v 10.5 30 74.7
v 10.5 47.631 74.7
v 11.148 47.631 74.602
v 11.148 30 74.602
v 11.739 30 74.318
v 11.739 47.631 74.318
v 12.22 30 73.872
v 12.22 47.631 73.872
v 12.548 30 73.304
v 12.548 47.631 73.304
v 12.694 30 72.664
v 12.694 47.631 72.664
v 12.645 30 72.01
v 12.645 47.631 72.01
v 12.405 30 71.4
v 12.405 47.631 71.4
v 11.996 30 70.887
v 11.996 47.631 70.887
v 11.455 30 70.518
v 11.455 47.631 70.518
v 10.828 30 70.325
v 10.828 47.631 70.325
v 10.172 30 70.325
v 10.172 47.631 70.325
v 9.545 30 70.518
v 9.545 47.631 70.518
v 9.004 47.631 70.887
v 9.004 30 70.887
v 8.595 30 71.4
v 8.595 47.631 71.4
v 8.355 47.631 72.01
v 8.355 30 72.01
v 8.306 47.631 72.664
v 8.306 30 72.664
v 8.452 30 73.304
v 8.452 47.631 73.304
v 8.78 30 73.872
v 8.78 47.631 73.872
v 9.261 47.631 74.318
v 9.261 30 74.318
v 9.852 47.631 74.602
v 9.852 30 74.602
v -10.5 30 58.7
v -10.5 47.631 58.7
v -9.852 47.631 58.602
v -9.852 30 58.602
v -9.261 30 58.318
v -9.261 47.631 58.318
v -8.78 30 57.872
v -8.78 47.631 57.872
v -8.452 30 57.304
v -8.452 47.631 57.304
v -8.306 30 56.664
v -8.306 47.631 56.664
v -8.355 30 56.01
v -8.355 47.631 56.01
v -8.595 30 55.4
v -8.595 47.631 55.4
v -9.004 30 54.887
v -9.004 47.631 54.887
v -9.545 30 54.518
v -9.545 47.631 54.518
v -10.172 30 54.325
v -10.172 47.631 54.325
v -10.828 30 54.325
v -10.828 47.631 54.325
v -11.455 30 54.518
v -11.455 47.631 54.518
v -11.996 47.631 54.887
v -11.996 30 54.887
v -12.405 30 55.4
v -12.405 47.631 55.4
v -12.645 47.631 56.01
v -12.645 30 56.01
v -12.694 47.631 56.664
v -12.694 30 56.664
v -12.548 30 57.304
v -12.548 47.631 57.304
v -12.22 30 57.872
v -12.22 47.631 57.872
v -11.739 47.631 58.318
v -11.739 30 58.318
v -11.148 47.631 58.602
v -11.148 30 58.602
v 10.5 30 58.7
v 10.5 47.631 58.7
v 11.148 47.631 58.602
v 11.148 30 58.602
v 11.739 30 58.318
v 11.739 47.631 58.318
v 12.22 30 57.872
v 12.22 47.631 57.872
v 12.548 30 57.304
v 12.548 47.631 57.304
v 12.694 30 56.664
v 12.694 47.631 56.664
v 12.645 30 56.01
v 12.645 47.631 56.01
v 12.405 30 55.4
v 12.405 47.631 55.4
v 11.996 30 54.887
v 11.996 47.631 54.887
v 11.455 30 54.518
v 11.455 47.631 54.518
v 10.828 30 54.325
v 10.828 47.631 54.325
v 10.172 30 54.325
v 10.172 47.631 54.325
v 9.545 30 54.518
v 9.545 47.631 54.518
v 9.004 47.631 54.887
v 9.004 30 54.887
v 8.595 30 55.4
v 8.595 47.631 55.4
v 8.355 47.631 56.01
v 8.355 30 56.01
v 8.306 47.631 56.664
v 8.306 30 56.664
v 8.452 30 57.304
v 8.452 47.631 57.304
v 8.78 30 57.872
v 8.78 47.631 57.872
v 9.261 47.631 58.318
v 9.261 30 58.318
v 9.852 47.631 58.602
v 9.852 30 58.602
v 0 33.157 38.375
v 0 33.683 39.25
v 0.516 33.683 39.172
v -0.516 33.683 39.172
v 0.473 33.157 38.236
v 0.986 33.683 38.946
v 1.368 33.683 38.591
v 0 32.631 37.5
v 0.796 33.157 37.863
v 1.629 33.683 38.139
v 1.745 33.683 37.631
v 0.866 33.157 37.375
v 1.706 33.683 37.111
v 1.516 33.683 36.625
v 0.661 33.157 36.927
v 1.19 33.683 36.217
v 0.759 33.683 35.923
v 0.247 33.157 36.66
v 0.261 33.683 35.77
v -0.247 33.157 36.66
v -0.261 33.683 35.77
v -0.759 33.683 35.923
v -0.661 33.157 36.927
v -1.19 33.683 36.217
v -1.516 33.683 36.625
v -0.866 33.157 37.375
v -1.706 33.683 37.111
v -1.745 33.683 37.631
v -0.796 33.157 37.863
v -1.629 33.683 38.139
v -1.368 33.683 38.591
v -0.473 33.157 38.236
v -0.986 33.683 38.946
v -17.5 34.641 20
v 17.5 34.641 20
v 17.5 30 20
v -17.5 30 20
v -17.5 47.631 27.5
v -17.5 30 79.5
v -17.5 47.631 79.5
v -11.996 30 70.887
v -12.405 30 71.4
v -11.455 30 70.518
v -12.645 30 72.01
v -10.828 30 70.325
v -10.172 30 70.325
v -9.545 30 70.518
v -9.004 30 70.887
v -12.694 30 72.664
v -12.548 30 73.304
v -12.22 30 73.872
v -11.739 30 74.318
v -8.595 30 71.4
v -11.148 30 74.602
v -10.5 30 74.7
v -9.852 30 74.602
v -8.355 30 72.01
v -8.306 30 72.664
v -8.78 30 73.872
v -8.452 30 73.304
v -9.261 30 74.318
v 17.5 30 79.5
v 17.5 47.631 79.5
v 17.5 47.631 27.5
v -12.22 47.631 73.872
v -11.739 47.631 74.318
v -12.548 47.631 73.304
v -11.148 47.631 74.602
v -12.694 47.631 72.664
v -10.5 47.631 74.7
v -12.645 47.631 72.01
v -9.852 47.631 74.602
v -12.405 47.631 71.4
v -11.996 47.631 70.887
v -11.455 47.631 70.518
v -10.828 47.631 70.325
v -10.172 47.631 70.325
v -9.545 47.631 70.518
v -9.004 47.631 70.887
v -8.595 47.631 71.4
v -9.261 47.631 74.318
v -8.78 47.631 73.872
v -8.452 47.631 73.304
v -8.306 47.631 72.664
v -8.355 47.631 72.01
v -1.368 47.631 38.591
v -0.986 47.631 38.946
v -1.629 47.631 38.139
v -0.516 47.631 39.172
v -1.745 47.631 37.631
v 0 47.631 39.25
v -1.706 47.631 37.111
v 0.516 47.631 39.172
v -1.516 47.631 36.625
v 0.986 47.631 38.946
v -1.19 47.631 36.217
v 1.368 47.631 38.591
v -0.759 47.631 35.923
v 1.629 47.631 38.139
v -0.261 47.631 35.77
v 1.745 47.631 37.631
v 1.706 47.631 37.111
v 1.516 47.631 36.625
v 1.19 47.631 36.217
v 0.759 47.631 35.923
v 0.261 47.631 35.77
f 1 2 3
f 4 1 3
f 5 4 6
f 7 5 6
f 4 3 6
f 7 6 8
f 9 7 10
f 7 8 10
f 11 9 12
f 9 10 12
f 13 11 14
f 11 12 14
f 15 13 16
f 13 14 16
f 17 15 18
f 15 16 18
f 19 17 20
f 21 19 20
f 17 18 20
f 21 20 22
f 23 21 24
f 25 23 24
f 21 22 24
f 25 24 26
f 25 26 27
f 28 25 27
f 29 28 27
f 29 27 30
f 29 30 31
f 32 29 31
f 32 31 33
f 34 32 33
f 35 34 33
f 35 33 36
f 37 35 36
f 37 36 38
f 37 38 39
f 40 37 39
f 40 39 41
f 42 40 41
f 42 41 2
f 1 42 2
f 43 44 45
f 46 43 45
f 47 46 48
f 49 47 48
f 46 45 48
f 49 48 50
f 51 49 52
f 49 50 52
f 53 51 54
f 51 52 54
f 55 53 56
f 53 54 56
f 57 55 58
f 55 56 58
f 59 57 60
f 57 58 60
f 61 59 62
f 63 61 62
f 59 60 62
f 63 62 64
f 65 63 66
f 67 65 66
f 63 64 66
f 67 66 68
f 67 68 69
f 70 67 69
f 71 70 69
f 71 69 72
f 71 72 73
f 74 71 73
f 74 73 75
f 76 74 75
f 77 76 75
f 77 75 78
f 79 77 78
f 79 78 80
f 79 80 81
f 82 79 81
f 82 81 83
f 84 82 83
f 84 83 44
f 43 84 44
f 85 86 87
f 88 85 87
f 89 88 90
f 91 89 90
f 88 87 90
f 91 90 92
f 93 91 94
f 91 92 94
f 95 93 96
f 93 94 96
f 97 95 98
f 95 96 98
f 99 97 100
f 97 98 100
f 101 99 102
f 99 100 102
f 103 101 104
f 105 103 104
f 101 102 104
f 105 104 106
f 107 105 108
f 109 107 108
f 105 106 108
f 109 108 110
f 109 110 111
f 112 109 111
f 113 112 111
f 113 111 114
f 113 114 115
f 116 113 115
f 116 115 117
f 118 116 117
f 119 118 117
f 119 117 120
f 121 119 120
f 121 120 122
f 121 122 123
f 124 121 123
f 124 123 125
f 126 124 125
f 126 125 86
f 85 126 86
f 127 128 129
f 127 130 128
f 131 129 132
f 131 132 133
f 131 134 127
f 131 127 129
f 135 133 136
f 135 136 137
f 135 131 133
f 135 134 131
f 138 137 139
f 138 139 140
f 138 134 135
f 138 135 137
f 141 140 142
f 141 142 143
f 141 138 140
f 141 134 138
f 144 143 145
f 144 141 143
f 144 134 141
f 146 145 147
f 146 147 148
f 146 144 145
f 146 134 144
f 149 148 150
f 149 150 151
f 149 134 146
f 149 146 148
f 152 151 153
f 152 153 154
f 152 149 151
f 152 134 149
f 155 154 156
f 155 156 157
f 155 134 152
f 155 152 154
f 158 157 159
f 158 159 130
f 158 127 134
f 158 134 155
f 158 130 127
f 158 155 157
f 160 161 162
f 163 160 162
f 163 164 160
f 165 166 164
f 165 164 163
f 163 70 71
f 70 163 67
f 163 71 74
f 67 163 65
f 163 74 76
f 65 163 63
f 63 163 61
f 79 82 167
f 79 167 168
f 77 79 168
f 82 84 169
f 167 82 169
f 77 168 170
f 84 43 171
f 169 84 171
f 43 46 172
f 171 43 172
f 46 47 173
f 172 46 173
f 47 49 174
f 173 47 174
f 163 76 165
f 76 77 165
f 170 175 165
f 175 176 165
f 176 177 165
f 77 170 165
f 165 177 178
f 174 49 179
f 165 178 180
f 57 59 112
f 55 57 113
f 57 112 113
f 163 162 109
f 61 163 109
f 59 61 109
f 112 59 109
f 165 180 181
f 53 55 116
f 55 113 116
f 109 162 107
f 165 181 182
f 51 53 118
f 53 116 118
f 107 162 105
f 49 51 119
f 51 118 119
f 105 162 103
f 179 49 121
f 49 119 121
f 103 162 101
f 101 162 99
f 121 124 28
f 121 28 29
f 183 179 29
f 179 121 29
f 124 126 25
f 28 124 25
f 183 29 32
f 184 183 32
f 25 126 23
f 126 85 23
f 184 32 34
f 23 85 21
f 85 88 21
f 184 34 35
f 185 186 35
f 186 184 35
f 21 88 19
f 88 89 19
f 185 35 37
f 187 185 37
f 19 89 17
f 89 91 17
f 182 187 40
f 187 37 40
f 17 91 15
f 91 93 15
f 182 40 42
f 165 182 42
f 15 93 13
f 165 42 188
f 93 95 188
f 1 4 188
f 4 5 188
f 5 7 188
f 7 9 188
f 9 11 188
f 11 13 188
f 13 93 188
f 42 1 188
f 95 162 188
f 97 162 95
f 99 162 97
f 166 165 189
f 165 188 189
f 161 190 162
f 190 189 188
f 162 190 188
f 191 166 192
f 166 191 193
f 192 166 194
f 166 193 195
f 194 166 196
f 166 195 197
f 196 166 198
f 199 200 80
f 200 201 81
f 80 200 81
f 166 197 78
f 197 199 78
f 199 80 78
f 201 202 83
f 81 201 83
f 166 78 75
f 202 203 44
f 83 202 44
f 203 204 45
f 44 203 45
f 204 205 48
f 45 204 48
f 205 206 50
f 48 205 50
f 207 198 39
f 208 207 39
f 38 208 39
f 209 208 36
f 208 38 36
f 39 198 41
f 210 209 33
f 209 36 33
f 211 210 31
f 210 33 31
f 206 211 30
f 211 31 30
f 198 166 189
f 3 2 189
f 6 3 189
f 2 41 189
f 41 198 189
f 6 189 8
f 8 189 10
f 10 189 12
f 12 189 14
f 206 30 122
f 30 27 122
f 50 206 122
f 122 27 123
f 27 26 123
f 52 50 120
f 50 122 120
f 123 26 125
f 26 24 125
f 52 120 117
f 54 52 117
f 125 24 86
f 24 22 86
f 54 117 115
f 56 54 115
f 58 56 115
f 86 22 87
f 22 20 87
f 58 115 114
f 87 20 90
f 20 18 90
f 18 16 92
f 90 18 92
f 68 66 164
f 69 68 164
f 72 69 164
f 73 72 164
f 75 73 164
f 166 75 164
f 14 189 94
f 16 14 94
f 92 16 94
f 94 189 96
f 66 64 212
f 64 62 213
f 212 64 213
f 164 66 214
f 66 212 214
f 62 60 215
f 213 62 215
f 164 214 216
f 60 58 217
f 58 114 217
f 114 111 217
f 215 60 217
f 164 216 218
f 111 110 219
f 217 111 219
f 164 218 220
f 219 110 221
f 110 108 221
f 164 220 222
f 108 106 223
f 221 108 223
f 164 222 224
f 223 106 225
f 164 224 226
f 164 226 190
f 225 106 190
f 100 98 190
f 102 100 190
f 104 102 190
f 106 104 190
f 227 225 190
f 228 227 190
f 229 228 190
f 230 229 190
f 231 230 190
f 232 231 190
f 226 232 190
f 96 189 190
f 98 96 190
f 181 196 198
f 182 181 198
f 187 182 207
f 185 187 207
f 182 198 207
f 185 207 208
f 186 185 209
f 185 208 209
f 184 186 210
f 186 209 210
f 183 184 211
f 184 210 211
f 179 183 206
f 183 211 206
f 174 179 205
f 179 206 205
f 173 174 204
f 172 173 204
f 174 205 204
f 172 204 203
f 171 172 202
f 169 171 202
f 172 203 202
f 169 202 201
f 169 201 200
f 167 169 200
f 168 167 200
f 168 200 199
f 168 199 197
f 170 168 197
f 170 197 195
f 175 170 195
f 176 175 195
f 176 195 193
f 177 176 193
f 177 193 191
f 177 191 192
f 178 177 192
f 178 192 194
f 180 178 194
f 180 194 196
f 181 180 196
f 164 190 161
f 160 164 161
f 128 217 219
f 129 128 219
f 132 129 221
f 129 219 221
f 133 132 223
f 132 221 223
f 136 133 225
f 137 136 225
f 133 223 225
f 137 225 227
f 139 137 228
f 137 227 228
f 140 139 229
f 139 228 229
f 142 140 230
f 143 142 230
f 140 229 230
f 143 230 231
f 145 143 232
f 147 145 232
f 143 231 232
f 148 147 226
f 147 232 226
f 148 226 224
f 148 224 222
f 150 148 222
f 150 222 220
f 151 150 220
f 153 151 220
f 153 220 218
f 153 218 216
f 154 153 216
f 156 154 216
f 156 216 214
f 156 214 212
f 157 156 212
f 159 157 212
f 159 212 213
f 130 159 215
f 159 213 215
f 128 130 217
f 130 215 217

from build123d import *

# Parameters (mm, degrees)
PAD_DEPTH      = 17.5
SKETCH001_R    = 2.2
HOLE_DEPTH     = 17.632397
SKETCH002_R    = 1.75
HOLE001_DEPTH  = 13.948494
HOLE001_TIPS_R = 1.75


with BuildPart() as part:
    # Sketch → Pad (new body, symmetric)
    with BuildSketch(Plane.YZ):
        Polygon((30, 20), (30, 79.5), (47.631397, 79.5), (47.631397, 27.5), (34.641016, 20), align=None)
    extrude(amount=PAD_DEPTH, both=True)

    # Sketch001 (on Face3 of Pad) → Hole (cut, through all)
    with BuildSketch(Plane.ZX.offset(47.631397)):
        with Locations((72.5, 10.5)):
            Circle(SKETCH001_R)
        with Locations((56.5, 10.5)):
            Circle(SKETCH001_R)
        with Locations((56.5, -10.5)):
            Circle(SKETCH001_R)
        with Locations((72.5, -10.5)):
            Circle(SKETCH001_R)
    extrude(amount=-HOLE_DEPTH, mode=Mode.SUBTRACT)

    # Sketch002 (on Face11 of Hole) → Hole001 (cut)
    with BuildSketch(Plane.ZX.offset(47.631397)):
        with Locations((37.5, 0)):
            Circle(SKETCH002_R)
    extrude(amount=-HOLE001_DEPTH, mode=Mode.SUBTRACT)

    # Hole001 tips → Hole001 tip 1 section 0
    with BuildSketch(Plane.ZX.offset(33.682903), mode=Mode.PRIVATE) as hole001_tip_1_s0:
        with Locations((37.5, 0)):
            Circle(HOLE001_TIPS_R)
    loft([hole001_tip_1_s0.sketch, Vertex(0, 32.631397, 37.5)], mode=Mode.SUBTRACT)


solid = part.part
